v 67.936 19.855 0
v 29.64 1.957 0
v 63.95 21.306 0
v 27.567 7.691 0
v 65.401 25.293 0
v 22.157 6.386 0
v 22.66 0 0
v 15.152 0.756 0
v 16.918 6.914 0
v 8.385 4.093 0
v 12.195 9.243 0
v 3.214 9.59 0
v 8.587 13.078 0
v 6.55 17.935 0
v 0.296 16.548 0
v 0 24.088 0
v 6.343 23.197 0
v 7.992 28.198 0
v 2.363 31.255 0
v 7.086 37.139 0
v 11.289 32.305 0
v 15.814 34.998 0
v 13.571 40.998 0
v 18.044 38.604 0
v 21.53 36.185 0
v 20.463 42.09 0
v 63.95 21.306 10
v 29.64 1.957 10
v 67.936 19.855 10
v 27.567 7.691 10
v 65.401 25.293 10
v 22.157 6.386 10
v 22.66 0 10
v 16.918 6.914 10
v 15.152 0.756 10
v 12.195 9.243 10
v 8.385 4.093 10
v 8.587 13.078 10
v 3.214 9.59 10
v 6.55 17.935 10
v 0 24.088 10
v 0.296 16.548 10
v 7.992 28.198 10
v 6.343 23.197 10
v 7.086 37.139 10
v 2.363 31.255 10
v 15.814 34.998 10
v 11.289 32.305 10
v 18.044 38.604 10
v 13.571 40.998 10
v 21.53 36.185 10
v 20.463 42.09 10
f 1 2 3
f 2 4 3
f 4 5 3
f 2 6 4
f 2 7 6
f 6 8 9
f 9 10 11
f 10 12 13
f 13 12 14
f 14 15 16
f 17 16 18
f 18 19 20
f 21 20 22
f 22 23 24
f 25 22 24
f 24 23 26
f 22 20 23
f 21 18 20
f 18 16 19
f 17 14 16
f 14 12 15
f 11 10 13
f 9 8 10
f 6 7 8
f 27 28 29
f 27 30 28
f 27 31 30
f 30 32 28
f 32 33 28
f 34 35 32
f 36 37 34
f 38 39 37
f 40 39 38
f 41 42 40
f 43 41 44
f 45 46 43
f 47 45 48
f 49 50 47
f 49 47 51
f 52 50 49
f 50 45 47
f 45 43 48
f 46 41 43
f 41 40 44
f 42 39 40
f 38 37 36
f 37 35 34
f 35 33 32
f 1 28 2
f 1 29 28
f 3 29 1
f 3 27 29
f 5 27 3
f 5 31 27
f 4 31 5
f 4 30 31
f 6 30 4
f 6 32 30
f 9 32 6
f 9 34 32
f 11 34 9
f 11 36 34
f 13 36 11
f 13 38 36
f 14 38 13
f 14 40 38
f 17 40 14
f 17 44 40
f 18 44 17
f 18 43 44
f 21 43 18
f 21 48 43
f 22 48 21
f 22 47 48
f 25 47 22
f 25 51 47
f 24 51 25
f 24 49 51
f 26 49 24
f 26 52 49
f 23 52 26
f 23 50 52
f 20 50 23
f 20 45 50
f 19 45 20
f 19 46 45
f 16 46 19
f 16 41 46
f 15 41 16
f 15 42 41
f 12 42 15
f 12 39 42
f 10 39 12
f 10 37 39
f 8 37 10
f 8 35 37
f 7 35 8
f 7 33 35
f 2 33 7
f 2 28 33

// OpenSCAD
$fn = 32;

// ----------------------------------------------------------------------
// Hook plate: curl radius 18 mm over 205 degrees, 6 mm thick band
// ----------------------------------------------------------------------

// --- parameters (mm) ---
profile_height = 10;      // extrusion height
profile_points = 26;      // points of the closed outline

profile = [[18.044, 38.604], [20.463, 42.09], [13.571, 40.998], [7.086, 37.139], [2.363, 31.255], [0, 24.088], [0.296, 16.548], [3.214, 9.59], [8.385, 4.093], [15.152, 0.756], [22.66, 0], [29.64, 1.957], [67.936, 19.855], [63.95, 21.306], [65.401, 25.293], [27.567, 7.691], [22.157, 6.386], [16.918, 6.914], [12.195, 9.243], [8.587, 13.078], [6.55, 17.935], [6.343, 23.197], [7.992, 28.198], [11.289, 32.305], [15.814, 34.998], [21.53, 36.185]];  // single closed polygon, 26 points, counter clockwise

// --- the one profile operation ---
linear_extrude(height = profile_height) polygon(points = profile);
